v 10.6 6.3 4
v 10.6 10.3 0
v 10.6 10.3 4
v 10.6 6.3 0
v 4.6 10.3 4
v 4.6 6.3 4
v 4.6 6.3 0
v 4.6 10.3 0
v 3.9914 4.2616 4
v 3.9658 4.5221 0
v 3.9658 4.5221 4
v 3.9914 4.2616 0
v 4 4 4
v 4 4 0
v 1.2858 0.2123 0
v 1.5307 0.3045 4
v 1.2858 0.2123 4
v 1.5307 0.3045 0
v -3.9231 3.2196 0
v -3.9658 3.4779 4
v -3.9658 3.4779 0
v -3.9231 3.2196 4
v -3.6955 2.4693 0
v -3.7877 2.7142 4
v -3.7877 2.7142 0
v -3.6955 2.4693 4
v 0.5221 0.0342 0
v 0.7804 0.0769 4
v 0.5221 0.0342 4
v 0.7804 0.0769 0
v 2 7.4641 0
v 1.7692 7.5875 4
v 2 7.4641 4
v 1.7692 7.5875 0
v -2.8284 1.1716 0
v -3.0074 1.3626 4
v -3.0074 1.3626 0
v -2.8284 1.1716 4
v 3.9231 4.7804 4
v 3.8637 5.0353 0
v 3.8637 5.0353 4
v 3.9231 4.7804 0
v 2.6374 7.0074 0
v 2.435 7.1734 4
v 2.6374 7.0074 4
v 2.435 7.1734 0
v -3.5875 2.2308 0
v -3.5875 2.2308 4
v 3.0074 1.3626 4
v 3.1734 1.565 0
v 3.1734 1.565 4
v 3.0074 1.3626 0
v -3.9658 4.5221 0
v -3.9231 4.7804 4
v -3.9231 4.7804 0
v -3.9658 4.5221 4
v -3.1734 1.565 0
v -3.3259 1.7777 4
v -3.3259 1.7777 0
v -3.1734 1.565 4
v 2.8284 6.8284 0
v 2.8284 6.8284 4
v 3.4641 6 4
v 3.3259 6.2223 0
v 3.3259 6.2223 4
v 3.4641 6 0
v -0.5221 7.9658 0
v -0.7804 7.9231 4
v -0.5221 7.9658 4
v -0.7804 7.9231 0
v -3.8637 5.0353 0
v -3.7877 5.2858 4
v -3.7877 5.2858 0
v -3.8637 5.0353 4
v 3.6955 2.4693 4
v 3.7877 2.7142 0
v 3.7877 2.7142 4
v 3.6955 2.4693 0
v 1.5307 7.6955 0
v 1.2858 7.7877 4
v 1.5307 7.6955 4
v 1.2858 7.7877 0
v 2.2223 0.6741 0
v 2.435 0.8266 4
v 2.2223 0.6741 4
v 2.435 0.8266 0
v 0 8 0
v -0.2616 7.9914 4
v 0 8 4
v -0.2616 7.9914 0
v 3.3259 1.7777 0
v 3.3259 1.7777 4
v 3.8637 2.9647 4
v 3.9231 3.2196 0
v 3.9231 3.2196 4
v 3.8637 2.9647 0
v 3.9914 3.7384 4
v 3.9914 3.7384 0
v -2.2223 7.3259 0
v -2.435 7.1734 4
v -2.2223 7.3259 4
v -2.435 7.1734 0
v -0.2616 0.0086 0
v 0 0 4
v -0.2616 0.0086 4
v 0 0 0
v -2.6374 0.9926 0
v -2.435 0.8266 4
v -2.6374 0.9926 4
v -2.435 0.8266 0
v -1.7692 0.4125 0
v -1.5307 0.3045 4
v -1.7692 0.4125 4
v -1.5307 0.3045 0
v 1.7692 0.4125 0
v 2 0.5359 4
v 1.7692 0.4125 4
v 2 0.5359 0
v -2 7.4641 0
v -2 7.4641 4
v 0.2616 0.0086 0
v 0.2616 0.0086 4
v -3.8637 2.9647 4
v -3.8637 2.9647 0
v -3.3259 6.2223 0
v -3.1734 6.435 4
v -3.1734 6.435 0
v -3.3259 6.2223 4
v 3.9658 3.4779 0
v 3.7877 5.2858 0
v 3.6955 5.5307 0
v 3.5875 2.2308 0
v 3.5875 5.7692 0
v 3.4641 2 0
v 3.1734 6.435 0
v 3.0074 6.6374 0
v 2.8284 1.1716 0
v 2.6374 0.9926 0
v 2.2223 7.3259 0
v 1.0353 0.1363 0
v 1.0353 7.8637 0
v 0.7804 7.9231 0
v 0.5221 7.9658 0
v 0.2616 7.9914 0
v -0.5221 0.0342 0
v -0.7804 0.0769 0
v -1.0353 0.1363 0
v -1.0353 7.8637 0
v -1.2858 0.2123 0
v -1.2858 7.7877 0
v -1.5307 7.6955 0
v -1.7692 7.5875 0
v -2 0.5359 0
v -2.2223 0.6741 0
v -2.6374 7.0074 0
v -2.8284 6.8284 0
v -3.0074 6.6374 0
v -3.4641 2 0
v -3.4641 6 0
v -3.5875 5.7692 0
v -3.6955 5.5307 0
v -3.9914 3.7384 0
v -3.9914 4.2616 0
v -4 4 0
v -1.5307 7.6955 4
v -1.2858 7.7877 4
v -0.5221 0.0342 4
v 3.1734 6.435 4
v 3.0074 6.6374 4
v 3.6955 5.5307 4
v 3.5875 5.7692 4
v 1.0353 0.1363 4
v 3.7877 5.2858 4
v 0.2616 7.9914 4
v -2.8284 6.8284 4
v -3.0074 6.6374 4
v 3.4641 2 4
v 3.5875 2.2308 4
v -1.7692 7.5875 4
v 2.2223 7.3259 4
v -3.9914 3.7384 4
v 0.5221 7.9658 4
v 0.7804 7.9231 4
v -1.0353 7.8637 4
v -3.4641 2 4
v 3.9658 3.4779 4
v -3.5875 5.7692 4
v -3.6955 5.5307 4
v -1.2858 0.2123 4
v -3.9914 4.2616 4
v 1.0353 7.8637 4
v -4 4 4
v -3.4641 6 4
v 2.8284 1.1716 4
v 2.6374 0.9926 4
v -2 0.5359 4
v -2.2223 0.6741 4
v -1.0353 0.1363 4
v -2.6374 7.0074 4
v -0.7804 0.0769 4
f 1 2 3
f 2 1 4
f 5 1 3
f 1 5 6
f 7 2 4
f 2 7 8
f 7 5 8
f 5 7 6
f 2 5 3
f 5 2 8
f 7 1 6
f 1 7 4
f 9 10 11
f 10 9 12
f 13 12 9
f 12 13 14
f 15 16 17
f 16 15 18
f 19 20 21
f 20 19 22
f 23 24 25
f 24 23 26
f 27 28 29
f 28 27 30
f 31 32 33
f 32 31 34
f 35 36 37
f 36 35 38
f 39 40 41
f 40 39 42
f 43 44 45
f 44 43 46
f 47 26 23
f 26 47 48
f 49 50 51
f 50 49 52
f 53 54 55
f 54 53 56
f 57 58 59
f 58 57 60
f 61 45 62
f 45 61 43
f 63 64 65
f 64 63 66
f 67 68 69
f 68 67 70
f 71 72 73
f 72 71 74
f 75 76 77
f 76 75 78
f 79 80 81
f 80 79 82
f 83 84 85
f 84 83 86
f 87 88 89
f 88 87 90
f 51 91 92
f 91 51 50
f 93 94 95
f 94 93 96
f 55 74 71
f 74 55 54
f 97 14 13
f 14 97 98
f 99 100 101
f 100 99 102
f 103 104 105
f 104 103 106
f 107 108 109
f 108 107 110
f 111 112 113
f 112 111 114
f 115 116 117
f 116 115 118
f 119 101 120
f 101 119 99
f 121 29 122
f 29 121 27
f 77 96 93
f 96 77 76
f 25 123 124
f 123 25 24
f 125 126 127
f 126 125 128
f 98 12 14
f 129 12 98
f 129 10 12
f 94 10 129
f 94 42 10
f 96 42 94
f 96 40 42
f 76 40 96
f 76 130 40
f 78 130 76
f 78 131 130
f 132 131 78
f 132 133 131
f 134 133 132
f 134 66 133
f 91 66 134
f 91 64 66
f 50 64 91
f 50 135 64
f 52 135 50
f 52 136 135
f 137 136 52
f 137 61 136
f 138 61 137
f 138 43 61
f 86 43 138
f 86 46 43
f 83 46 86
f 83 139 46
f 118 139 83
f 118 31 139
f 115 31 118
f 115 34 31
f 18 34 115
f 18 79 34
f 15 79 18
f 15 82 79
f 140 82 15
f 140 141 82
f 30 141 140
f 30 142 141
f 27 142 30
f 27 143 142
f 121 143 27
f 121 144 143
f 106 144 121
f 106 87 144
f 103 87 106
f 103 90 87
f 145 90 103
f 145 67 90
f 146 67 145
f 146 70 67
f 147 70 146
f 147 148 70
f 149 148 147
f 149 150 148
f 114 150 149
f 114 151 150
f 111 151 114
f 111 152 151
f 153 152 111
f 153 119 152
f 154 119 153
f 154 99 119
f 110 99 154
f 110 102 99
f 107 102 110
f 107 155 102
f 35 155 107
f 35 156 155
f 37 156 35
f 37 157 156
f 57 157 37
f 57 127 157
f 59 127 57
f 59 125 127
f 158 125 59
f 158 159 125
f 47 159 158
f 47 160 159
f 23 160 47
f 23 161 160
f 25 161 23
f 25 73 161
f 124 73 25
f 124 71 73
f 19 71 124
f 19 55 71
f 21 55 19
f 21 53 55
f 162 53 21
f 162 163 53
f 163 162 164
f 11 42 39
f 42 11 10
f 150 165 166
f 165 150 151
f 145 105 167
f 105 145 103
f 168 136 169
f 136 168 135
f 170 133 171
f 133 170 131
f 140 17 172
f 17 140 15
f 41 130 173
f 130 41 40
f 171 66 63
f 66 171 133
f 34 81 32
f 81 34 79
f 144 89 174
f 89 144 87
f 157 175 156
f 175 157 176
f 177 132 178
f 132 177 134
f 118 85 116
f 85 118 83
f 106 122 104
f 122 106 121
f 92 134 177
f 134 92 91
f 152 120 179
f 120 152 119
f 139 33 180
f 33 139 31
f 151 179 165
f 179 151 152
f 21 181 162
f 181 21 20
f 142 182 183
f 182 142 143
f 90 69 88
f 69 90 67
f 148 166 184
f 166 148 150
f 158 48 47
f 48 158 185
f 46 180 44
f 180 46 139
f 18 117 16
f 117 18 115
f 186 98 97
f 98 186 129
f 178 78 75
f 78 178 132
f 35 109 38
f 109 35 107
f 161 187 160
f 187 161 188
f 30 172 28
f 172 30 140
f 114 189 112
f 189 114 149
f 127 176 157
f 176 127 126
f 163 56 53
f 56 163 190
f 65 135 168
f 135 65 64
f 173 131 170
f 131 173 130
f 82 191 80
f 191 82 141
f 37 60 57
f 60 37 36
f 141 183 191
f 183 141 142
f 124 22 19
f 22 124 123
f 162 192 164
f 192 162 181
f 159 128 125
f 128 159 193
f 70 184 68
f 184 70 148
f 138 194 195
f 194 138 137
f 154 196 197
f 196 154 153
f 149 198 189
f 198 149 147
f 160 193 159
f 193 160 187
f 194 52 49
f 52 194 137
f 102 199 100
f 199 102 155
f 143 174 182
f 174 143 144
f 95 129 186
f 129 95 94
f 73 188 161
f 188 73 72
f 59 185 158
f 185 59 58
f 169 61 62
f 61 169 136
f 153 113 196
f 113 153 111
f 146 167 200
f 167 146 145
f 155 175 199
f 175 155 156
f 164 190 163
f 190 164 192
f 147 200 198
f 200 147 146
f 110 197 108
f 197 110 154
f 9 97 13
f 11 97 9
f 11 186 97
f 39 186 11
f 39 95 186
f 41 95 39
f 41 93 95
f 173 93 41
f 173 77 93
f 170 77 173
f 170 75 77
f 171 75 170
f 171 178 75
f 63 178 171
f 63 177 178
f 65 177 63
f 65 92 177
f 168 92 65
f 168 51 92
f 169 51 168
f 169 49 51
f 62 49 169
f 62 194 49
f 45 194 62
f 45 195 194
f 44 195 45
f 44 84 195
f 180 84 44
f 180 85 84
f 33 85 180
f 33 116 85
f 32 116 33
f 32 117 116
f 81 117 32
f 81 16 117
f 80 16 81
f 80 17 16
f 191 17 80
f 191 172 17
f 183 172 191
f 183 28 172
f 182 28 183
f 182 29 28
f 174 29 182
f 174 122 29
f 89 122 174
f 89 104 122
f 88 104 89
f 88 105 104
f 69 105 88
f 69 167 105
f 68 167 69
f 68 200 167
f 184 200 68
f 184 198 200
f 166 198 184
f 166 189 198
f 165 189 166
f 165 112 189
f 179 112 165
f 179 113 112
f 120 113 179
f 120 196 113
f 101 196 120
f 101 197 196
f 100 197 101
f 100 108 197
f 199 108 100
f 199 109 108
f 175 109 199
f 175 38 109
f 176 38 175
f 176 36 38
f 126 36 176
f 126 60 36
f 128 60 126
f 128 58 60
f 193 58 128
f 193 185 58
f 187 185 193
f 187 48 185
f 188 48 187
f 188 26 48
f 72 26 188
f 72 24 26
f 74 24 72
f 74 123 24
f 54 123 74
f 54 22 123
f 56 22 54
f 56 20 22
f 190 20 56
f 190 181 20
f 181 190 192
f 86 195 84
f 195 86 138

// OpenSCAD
// Parametrisch model gebaseerd op de aangeleverde schets
// Een lichte maar verstevigde haak / clip structuur
// Units = mm

$fn = 96;

// Algemene parameters
thickness = 16;
reinforcmentThickness= 8;
wall = 4;
fingerHoleDiameter=20;


// Buitencontour
module outer_shape() {
    translate([4.6,6.3])
        cube([6,wall, wall]);
    translate([0,4])
        cylinder(h=wall,r=4);
    polygon(points=[
        [0,0],
        [17,0],
        [17,4],
        [24,8]
        ]);
}

// Binnenuitsparing om gewicht te besparen
module inner_cutout() {
    offset(r=-wall)
      outer_shape();
  
}

// Haakopening bovenaan
module hook_cutout() {
    difference() {
        offset(r=4)
        polygon(points=[
            [18,28],
            [48,28],
            [64,45],
            [56,52],
            [45,42],
            [18,42]
        ]);

        polygon(points=[
            [20,31],
            [46,31],
            [58,44],
            [54,47],
            [44,38],
            [20,38]
        ]);
    }
}

// Verstevigde gaten
module reinforced_holes() {
    // links
    difference() {
        translate([8,-2]) circle(r=fingerHoleDiameter);
        translate([8,-2]) circle(r=fingerHoleDiameter-wall);
    }

    // rechts
    difference() {
        translate([92,0]) circle(r=fingerHoleDiameter);
        translate([92,0]) circle(r=fingerHoleDiameter-wall);
    }
}

// Klein centraal verstevigingspunt
module top_boss() {
    translate([63,18])
    difference() {
        circle(r=6);
        circle(r=3);
    }
}

// Hoofdmodel
linear_extrude(height=thickness)
outer_shape();

difference() {
    union() {
        difference() {
            outer_shape();
//            inner_cutout();
        }
//
//        reinforced_holes();
////        top_boss();
    }
//
//    // Doorlopende gaten
////    translate([8,-2]) circle(r=9);
////    translate([92,0]) circle(r=9);
//
//    // Haakopening
////    hook_cutout();
}
